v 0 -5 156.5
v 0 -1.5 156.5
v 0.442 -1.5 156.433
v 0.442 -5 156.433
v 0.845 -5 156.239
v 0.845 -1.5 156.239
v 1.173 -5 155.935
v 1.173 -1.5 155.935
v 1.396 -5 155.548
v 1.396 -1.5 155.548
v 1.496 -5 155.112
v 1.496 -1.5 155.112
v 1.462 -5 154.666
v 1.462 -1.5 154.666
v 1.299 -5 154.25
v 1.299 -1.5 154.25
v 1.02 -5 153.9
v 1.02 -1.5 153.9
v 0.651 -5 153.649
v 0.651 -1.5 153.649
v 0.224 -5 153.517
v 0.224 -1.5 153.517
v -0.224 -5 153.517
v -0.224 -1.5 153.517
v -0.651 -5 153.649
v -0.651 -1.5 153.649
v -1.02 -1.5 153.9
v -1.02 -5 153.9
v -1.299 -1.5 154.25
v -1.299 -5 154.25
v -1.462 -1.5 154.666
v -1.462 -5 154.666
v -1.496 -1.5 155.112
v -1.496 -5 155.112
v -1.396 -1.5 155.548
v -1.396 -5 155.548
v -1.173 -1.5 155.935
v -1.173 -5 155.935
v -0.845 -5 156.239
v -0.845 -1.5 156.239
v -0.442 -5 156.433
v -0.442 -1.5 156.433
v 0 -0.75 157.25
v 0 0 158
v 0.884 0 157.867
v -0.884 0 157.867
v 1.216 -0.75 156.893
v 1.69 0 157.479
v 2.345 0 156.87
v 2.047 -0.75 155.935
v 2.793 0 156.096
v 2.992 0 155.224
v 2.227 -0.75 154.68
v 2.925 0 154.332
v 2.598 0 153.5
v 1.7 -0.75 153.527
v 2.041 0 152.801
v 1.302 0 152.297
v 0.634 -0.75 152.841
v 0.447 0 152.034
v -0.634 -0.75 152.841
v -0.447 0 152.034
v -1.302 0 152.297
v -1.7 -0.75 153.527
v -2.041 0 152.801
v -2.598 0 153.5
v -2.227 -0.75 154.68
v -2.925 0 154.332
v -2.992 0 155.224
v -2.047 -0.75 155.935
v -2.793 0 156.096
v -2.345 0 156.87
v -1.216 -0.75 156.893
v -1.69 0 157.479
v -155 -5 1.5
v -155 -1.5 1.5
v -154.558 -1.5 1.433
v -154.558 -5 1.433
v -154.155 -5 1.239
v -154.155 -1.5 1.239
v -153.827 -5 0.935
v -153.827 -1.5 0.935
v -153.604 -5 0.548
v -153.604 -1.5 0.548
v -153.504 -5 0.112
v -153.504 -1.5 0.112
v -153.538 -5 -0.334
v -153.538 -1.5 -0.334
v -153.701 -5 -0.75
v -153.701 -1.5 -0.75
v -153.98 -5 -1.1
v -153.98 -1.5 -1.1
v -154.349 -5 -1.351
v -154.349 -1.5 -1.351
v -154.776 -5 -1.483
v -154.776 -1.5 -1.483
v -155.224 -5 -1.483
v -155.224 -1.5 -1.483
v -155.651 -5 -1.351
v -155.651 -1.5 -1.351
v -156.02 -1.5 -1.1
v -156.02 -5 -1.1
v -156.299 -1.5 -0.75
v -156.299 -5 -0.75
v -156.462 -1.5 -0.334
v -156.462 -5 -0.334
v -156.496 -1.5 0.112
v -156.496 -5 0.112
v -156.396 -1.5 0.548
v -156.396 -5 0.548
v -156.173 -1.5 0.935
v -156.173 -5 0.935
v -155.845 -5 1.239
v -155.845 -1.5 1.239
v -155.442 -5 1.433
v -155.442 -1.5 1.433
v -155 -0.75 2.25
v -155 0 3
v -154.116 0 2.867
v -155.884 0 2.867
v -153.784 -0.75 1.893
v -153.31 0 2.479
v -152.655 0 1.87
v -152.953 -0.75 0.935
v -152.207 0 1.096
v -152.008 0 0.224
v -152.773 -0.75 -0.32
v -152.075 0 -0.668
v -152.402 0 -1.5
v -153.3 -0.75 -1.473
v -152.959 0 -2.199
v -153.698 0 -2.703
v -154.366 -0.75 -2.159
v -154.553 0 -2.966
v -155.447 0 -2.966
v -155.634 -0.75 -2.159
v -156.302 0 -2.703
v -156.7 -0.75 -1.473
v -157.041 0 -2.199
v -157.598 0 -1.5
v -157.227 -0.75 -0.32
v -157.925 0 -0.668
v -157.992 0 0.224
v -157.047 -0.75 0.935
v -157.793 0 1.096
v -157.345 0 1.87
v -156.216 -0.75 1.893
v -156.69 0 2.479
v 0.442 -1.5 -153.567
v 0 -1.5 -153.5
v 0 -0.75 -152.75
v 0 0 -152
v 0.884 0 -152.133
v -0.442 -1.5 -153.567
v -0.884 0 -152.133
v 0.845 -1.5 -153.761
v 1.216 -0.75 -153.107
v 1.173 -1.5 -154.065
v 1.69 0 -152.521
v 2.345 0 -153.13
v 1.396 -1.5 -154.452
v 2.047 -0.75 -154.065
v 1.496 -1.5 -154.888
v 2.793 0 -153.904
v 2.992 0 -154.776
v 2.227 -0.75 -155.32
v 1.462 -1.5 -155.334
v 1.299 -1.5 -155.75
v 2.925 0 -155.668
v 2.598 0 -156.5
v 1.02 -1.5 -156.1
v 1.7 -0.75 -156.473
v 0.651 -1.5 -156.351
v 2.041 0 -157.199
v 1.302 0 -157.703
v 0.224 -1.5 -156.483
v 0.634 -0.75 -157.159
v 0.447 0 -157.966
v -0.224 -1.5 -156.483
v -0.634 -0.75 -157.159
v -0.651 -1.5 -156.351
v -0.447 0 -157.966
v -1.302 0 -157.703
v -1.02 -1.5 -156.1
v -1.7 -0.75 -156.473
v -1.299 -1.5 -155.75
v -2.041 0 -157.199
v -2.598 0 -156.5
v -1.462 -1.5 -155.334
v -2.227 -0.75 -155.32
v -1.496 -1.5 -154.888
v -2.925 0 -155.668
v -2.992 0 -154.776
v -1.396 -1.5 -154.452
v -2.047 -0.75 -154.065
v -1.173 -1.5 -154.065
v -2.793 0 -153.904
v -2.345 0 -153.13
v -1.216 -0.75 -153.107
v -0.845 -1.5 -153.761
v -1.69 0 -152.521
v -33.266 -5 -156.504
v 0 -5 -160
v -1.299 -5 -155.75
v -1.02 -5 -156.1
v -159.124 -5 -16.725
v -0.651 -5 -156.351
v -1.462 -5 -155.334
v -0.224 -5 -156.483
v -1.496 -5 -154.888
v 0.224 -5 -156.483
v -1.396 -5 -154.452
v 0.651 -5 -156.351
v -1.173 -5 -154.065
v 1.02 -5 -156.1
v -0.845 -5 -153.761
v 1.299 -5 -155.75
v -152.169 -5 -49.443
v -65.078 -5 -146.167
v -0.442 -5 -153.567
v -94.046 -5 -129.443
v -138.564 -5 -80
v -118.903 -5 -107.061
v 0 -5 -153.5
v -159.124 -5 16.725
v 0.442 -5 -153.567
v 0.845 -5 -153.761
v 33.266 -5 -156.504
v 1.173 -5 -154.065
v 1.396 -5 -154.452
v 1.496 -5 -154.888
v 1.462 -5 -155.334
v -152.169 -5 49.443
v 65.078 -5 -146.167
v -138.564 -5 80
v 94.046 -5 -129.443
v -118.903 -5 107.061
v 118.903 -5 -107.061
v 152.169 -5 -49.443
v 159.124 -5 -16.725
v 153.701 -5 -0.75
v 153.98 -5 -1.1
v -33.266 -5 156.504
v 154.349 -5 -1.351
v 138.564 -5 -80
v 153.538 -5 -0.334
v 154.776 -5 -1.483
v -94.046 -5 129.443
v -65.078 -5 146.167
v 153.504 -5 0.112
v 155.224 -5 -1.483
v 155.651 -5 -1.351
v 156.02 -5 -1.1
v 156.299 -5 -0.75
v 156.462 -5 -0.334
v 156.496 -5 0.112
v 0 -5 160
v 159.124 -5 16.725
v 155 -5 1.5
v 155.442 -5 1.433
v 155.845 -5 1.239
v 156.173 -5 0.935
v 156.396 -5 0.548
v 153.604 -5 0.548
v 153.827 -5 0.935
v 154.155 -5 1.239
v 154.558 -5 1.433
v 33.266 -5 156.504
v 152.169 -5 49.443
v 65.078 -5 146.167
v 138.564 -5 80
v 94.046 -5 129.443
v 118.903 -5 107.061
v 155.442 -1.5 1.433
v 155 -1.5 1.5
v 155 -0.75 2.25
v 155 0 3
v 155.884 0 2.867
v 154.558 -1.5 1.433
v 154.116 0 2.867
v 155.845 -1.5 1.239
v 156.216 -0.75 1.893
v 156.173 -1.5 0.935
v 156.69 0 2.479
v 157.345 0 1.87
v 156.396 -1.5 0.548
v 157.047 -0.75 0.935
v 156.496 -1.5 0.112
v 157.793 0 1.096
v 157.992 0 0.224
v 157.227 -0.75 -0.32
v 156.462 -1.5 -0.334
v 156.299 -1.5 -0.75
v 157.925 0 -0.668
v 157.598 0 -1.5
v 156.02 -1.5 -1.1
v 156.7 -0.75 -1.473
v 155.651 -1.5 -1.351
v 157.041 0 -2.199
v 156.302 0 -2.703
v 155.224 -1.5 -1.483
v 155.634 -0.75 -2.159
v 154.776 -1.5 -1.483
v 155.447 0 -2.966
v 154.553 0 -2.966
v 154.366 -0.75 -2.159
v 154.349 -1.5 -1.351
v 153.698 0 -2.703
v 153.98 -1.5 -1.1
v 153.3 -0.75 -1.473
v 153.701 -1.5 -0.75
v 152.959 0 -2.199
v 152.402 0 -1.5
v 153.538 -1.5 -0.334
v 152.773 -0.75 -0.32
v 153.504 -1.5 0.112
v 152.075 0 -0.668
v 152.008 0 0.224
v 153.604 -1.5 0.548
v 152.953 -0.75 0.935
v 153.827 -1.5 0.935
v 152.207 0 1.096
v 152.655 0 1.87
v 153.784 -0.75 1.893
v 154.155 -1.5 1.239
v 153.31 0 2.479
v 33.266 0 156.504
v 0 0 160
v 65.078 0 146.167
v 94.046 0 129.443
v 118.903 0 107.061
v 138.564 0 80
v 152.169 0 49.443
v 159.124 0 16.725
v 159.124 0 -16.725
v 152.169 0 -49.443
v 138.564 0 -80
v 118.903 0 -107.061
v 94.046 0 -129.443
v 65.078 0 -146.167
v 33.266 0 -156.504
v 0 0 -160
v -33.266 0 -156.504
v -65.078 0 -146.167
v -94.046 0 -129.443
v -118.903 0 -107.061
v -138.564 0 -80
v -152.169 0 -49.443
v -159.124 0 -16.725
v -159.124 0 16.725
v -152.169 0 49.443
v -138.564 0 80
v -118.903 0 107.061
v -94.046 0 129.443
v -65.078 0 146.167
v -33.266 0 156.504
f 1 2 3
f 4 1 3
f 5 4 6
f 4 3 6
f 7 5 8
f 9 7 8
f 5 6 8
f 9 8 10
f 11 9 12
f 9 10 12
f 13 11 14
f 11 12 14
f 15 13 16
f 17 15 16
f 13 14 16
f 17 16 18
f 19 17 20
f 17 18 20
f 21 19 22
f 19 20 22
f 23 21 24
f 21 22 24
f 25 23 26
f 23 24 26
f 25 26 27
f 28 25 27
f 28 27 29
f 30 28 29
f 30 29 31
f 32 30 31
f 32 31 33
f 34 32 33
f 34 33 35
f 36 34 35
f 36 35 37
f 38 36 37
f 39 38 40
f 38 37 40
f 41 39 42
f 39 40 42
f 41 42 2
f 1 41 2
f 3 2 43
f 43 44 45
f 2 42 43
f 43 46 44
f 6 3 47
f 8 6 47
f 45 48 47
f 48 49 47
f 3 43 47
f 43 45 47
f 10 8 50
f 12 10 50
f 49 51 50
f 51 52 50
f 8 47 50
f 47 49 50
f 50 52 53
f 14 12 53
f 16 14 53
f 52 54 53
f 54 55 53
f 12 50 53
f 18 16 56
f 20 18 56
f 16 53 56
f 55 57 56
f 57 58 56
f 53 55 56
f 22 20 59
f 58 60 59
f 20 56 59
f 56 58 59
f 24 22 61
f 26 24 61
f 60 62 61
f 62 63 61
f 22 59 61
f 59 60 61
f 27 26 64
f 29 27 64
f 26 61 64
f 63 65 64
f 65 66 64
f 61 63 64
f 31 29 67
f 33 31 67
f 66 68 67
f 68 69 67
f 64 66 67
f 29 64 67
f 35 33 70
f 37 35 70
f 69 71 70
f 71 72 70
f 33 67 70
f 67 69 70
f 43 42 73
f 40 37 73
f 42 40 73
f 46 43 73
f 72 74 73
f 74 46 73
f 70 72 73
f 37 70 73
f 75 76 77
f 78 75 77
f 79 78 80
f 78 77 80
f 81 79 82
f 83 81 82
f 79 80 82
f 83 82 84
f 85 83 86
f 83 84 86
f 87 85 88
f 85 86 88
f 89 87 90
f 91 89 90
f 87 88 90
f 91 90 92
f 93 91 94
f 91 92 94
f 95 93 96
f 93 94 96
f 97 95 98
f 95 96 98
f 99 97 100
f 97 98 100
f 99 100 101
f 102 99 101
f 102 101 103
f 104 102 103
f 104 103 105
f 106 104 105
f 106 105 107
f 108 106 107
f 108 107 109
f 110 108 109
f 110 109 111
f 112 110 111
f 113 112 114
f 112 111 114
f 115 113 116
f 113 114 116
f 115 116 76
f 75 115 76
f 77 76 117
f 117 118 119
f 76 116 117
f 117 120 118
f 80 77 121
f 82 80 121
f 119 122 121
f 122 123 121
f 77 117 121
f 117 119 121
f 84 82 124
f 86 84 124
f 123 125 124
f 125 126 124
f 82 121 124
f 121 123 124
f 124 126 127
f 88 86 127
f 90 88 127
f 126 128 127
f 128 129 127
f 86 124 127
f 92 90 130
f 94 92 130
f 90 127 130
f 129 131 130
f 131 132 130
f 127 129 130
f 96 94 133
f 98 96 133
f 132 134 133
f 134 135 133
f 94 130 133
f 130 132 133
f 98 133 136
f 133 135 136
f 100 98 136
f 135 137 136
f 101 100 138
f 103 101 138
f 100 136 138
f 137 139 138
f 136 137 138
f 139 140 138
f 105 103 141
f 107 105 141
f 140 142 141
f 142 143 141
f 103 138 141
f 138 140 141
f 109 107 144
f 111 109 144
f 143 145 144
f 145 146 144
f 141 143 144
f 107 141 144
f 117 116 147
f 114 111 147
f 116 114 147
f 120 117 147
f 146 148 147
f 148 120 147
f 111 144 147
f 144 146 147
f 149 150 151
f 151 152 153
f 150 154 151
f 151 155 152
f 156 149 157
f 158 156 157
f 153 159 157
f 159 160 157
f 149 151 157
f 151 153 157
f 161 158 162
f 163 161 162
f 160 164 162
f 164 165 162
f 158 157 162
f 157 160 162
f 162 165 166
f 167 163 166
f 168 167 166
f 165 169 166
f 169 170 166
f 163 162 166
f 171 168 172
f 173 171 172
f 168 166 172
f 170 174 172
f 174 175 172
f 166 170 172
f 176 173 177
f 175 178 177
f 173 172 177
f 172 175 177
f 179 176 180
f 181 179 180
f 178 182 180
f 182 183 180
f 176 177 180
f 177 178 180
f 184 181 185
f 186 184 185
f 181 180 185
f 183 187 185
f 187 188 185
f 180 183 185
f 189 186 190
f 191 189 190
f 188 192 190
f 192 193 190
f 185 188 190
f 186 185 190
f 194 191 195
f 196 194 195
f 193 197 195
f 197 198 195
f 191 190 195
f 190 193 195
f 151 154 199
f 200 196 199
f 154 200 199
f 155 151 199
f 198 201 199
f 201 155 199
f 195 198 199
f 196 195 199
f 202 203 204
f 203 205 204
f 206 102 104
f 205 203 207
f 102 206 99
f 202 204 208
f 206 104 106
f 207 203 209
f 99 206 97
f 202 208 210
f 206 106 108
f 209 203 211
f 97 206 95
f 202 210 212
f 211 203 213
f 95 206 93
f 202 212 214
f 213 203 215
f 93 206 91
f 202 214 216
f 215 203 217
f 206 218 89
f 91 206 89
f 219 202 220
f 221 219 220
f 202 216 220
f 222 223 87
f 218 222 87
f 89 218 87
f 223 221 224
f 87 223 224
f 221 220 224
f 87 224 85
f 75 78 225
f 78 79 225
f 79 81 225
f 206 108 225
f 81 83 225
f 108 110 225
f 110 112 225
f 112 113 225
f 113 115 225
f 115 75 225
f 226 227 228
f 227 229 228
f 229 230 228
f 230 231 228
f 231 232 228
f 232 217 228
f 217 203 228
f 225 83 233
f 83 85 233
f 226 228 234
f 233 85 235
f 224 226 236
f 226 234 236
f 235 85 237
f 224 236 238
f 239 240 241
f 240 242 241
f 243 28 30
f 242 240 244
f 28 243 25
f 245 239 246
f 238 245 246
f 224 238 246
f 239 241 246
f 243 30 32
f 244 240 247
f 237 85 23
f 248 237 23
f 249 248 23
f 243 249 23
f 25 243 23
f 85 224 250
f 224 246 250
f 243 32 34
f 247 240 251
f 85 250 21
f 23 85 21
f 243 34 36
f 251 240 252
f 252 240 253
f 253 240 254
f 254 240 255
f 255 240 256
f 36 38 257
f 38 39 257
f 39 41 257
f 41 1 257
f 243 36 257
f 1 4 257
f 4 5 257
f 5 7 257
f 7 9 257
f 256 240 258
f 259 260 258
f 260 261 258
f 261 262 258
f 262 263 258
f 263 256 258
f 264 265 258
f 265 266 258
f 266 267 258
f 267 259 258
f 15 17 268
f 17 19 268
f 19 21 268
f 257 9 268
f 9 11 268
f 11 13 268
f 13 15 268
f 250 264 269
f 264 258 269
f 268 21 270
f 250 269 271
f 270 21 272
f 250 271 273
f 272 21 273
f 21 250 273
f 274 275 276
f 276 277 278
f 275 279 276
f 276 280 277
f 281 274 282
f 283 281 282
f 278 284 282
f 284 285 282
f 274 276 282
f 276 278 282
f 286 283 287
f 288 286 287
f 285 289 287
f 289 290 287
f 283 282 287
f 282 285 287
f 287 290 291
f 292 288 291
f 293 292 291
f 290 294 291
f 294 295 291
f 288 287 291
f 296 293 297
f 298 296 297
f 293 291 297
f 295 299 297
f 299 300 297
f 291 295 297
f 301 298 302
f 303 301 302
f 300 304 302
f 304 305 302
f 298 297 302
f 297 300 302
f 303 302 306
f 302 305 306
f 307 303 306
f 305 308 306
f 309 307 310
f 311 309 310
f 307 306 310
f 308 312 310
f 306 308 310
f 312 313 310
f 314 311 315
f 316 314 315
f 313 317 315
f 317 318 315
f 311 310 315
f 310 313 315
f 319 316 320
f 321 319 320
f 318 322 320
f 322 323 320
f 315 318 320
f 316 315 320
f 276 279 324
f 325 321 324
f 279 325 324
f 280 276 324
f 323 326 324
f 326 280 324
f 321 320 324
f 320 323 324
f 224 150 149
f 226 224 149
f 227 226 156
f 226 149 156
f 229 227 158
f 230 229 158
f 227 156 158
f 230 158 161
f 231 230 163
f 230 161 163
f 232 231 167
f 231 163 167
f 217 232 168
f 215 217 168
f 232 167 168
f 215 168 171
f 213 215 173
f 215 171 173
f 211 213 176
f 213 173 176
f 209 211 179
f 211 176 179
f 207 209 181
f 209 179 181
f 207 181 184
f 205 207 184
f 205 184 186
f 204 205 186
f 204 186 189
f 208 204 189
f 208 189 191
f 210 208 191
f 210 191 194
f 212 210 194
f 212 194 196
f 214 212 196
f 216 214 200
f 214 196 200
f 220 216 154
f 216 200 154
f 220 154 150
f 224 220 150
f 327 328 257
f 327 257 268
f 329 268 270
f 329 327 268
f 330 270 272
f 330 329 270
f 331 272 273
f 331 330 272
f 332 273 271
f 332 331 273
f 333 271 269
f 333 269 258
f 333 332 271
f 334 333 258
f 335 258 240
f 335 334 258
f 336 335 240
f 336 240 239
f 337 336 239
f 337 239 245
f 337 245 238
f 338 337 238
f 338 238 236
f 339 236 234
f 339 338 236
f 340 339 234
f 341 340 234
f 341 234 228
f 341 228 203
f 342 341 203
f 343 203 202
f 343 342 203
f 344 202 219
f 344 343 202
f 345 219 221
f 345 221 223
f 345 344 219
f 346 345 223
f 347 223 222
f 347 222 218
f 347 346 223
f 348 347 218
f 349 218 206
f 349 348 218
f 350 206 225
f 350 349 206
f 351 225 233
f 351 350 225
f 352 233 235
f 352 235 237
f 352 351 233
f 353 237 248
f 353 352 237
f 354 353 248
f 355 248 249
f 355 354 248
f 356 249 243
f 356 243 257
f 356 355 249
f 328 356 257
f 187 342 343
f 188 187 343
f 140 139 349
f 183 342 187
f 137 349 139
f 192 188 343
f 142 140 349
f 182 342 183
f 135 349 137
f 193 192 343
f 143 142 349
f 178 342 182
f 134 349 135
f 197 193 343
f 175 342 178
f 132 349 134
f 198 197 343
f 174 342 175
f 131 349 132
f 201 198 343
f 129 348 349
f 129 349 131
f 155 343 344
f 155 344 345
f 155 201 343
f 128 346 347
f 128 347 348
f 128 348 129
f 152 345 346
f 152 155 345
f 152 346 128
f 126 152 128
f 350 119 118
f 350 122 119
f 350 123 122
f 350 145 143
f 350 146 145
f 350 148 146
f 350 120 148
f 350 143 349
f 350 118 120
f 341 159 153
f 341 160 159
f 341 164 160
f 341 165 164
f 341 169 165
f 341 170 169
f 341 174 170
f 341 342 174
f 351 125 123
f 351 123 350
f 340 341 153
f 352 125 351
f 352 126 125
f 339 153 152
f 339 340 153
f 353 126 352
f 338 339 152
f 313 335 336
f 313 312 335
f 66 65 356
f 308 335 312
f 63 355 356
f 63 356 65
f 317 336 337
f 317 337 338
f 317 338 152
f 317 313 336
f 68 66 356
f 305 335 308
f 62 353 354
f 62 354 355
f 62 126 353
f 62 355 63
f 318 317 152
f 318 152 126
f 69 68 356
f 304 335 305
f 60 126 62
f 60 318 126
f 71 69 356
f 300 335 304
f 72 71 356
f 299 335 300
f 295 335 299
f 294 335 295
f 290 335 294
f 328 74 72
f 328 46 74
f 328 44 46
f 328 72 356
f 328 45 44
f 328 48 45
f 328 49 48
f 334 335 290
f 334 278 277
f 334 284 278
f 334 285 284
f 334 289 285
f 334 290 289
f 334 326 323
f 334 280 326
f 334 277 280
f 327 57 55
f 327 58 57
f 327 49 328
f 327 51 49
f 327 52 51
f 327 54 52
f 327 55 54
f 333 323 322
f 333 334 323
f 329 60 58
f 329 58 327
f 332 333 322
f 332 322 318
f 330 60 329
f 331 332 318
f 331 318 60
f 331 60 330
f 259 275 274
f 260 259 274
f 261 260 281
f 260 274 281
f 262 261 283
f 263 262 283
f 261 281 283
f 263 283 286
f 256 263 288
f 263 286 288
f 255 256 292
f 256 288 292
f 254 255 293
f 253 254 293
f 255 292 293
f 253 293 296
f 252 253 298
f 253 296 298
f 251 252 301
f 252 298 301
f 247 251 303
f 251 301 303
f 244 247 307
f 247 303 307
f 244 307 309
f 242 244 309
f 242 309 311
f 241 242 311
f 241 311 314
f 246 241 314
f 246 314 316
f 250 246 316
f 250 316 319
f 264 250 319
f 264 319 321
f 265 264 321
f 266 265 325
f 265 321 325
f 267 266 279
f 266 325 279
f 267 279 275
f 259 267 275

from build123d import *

# Parameters (mm, degrees)
SKETCH1_R           = 160
SKETCH1_R_2         = 1.5
BOSS_EXTRUDE1_DEPTH = 5
CHAMFER1_SIZE       = 1.5


with BuildPart() as part:
    # Sketch1 → Boss-Extrude1 (new body)
    with BuildSketch(Plane(origin=(0, 0, 0), x_dir=(1, 0, 0), z_dir=(0, 1, 0))):
        with Locations(Location((0, 0, 0), (0, 0, 270))):
            Circle(SKETCH1_R)
        with Locations(Location((155, 0, 0), (0, 0, 270))):
            Circle(SKETCH1_R_2, mode=Mode.SUBTRACT)
        with Locations(Location((0, -155, 0), (0, 0, 270))):
            Circle(SKETCH1_R_2, mode=Mode.SUBTRACT)
        with Locations(Location((-155, 0, 0), (0, 0, 270))):
            Circle(SKETCH1_R_2, mode=Mode.SUBTRACT)
        with Locations(Location((0, 155, 0), (0, 0, 270))):
            Circle(SKETCH1_R_2, mode=Mode.SUBTRACT)
    extrude(amount=-BOSS_EXTRUDE1_DEPTH)

    # Chamfer1
    chamfer1_edges = [part.edges().sort_by_distance(p)[0] for p in [
        (-155, 0, -1.5),
        (0, 0, -156.5),
        (155, 0, -1.5),
        (0, 0, 153.5),
    ]]
    chamfer(chamfer1_edges, length=CHAMFER1_SIZE)


solid = part.part
